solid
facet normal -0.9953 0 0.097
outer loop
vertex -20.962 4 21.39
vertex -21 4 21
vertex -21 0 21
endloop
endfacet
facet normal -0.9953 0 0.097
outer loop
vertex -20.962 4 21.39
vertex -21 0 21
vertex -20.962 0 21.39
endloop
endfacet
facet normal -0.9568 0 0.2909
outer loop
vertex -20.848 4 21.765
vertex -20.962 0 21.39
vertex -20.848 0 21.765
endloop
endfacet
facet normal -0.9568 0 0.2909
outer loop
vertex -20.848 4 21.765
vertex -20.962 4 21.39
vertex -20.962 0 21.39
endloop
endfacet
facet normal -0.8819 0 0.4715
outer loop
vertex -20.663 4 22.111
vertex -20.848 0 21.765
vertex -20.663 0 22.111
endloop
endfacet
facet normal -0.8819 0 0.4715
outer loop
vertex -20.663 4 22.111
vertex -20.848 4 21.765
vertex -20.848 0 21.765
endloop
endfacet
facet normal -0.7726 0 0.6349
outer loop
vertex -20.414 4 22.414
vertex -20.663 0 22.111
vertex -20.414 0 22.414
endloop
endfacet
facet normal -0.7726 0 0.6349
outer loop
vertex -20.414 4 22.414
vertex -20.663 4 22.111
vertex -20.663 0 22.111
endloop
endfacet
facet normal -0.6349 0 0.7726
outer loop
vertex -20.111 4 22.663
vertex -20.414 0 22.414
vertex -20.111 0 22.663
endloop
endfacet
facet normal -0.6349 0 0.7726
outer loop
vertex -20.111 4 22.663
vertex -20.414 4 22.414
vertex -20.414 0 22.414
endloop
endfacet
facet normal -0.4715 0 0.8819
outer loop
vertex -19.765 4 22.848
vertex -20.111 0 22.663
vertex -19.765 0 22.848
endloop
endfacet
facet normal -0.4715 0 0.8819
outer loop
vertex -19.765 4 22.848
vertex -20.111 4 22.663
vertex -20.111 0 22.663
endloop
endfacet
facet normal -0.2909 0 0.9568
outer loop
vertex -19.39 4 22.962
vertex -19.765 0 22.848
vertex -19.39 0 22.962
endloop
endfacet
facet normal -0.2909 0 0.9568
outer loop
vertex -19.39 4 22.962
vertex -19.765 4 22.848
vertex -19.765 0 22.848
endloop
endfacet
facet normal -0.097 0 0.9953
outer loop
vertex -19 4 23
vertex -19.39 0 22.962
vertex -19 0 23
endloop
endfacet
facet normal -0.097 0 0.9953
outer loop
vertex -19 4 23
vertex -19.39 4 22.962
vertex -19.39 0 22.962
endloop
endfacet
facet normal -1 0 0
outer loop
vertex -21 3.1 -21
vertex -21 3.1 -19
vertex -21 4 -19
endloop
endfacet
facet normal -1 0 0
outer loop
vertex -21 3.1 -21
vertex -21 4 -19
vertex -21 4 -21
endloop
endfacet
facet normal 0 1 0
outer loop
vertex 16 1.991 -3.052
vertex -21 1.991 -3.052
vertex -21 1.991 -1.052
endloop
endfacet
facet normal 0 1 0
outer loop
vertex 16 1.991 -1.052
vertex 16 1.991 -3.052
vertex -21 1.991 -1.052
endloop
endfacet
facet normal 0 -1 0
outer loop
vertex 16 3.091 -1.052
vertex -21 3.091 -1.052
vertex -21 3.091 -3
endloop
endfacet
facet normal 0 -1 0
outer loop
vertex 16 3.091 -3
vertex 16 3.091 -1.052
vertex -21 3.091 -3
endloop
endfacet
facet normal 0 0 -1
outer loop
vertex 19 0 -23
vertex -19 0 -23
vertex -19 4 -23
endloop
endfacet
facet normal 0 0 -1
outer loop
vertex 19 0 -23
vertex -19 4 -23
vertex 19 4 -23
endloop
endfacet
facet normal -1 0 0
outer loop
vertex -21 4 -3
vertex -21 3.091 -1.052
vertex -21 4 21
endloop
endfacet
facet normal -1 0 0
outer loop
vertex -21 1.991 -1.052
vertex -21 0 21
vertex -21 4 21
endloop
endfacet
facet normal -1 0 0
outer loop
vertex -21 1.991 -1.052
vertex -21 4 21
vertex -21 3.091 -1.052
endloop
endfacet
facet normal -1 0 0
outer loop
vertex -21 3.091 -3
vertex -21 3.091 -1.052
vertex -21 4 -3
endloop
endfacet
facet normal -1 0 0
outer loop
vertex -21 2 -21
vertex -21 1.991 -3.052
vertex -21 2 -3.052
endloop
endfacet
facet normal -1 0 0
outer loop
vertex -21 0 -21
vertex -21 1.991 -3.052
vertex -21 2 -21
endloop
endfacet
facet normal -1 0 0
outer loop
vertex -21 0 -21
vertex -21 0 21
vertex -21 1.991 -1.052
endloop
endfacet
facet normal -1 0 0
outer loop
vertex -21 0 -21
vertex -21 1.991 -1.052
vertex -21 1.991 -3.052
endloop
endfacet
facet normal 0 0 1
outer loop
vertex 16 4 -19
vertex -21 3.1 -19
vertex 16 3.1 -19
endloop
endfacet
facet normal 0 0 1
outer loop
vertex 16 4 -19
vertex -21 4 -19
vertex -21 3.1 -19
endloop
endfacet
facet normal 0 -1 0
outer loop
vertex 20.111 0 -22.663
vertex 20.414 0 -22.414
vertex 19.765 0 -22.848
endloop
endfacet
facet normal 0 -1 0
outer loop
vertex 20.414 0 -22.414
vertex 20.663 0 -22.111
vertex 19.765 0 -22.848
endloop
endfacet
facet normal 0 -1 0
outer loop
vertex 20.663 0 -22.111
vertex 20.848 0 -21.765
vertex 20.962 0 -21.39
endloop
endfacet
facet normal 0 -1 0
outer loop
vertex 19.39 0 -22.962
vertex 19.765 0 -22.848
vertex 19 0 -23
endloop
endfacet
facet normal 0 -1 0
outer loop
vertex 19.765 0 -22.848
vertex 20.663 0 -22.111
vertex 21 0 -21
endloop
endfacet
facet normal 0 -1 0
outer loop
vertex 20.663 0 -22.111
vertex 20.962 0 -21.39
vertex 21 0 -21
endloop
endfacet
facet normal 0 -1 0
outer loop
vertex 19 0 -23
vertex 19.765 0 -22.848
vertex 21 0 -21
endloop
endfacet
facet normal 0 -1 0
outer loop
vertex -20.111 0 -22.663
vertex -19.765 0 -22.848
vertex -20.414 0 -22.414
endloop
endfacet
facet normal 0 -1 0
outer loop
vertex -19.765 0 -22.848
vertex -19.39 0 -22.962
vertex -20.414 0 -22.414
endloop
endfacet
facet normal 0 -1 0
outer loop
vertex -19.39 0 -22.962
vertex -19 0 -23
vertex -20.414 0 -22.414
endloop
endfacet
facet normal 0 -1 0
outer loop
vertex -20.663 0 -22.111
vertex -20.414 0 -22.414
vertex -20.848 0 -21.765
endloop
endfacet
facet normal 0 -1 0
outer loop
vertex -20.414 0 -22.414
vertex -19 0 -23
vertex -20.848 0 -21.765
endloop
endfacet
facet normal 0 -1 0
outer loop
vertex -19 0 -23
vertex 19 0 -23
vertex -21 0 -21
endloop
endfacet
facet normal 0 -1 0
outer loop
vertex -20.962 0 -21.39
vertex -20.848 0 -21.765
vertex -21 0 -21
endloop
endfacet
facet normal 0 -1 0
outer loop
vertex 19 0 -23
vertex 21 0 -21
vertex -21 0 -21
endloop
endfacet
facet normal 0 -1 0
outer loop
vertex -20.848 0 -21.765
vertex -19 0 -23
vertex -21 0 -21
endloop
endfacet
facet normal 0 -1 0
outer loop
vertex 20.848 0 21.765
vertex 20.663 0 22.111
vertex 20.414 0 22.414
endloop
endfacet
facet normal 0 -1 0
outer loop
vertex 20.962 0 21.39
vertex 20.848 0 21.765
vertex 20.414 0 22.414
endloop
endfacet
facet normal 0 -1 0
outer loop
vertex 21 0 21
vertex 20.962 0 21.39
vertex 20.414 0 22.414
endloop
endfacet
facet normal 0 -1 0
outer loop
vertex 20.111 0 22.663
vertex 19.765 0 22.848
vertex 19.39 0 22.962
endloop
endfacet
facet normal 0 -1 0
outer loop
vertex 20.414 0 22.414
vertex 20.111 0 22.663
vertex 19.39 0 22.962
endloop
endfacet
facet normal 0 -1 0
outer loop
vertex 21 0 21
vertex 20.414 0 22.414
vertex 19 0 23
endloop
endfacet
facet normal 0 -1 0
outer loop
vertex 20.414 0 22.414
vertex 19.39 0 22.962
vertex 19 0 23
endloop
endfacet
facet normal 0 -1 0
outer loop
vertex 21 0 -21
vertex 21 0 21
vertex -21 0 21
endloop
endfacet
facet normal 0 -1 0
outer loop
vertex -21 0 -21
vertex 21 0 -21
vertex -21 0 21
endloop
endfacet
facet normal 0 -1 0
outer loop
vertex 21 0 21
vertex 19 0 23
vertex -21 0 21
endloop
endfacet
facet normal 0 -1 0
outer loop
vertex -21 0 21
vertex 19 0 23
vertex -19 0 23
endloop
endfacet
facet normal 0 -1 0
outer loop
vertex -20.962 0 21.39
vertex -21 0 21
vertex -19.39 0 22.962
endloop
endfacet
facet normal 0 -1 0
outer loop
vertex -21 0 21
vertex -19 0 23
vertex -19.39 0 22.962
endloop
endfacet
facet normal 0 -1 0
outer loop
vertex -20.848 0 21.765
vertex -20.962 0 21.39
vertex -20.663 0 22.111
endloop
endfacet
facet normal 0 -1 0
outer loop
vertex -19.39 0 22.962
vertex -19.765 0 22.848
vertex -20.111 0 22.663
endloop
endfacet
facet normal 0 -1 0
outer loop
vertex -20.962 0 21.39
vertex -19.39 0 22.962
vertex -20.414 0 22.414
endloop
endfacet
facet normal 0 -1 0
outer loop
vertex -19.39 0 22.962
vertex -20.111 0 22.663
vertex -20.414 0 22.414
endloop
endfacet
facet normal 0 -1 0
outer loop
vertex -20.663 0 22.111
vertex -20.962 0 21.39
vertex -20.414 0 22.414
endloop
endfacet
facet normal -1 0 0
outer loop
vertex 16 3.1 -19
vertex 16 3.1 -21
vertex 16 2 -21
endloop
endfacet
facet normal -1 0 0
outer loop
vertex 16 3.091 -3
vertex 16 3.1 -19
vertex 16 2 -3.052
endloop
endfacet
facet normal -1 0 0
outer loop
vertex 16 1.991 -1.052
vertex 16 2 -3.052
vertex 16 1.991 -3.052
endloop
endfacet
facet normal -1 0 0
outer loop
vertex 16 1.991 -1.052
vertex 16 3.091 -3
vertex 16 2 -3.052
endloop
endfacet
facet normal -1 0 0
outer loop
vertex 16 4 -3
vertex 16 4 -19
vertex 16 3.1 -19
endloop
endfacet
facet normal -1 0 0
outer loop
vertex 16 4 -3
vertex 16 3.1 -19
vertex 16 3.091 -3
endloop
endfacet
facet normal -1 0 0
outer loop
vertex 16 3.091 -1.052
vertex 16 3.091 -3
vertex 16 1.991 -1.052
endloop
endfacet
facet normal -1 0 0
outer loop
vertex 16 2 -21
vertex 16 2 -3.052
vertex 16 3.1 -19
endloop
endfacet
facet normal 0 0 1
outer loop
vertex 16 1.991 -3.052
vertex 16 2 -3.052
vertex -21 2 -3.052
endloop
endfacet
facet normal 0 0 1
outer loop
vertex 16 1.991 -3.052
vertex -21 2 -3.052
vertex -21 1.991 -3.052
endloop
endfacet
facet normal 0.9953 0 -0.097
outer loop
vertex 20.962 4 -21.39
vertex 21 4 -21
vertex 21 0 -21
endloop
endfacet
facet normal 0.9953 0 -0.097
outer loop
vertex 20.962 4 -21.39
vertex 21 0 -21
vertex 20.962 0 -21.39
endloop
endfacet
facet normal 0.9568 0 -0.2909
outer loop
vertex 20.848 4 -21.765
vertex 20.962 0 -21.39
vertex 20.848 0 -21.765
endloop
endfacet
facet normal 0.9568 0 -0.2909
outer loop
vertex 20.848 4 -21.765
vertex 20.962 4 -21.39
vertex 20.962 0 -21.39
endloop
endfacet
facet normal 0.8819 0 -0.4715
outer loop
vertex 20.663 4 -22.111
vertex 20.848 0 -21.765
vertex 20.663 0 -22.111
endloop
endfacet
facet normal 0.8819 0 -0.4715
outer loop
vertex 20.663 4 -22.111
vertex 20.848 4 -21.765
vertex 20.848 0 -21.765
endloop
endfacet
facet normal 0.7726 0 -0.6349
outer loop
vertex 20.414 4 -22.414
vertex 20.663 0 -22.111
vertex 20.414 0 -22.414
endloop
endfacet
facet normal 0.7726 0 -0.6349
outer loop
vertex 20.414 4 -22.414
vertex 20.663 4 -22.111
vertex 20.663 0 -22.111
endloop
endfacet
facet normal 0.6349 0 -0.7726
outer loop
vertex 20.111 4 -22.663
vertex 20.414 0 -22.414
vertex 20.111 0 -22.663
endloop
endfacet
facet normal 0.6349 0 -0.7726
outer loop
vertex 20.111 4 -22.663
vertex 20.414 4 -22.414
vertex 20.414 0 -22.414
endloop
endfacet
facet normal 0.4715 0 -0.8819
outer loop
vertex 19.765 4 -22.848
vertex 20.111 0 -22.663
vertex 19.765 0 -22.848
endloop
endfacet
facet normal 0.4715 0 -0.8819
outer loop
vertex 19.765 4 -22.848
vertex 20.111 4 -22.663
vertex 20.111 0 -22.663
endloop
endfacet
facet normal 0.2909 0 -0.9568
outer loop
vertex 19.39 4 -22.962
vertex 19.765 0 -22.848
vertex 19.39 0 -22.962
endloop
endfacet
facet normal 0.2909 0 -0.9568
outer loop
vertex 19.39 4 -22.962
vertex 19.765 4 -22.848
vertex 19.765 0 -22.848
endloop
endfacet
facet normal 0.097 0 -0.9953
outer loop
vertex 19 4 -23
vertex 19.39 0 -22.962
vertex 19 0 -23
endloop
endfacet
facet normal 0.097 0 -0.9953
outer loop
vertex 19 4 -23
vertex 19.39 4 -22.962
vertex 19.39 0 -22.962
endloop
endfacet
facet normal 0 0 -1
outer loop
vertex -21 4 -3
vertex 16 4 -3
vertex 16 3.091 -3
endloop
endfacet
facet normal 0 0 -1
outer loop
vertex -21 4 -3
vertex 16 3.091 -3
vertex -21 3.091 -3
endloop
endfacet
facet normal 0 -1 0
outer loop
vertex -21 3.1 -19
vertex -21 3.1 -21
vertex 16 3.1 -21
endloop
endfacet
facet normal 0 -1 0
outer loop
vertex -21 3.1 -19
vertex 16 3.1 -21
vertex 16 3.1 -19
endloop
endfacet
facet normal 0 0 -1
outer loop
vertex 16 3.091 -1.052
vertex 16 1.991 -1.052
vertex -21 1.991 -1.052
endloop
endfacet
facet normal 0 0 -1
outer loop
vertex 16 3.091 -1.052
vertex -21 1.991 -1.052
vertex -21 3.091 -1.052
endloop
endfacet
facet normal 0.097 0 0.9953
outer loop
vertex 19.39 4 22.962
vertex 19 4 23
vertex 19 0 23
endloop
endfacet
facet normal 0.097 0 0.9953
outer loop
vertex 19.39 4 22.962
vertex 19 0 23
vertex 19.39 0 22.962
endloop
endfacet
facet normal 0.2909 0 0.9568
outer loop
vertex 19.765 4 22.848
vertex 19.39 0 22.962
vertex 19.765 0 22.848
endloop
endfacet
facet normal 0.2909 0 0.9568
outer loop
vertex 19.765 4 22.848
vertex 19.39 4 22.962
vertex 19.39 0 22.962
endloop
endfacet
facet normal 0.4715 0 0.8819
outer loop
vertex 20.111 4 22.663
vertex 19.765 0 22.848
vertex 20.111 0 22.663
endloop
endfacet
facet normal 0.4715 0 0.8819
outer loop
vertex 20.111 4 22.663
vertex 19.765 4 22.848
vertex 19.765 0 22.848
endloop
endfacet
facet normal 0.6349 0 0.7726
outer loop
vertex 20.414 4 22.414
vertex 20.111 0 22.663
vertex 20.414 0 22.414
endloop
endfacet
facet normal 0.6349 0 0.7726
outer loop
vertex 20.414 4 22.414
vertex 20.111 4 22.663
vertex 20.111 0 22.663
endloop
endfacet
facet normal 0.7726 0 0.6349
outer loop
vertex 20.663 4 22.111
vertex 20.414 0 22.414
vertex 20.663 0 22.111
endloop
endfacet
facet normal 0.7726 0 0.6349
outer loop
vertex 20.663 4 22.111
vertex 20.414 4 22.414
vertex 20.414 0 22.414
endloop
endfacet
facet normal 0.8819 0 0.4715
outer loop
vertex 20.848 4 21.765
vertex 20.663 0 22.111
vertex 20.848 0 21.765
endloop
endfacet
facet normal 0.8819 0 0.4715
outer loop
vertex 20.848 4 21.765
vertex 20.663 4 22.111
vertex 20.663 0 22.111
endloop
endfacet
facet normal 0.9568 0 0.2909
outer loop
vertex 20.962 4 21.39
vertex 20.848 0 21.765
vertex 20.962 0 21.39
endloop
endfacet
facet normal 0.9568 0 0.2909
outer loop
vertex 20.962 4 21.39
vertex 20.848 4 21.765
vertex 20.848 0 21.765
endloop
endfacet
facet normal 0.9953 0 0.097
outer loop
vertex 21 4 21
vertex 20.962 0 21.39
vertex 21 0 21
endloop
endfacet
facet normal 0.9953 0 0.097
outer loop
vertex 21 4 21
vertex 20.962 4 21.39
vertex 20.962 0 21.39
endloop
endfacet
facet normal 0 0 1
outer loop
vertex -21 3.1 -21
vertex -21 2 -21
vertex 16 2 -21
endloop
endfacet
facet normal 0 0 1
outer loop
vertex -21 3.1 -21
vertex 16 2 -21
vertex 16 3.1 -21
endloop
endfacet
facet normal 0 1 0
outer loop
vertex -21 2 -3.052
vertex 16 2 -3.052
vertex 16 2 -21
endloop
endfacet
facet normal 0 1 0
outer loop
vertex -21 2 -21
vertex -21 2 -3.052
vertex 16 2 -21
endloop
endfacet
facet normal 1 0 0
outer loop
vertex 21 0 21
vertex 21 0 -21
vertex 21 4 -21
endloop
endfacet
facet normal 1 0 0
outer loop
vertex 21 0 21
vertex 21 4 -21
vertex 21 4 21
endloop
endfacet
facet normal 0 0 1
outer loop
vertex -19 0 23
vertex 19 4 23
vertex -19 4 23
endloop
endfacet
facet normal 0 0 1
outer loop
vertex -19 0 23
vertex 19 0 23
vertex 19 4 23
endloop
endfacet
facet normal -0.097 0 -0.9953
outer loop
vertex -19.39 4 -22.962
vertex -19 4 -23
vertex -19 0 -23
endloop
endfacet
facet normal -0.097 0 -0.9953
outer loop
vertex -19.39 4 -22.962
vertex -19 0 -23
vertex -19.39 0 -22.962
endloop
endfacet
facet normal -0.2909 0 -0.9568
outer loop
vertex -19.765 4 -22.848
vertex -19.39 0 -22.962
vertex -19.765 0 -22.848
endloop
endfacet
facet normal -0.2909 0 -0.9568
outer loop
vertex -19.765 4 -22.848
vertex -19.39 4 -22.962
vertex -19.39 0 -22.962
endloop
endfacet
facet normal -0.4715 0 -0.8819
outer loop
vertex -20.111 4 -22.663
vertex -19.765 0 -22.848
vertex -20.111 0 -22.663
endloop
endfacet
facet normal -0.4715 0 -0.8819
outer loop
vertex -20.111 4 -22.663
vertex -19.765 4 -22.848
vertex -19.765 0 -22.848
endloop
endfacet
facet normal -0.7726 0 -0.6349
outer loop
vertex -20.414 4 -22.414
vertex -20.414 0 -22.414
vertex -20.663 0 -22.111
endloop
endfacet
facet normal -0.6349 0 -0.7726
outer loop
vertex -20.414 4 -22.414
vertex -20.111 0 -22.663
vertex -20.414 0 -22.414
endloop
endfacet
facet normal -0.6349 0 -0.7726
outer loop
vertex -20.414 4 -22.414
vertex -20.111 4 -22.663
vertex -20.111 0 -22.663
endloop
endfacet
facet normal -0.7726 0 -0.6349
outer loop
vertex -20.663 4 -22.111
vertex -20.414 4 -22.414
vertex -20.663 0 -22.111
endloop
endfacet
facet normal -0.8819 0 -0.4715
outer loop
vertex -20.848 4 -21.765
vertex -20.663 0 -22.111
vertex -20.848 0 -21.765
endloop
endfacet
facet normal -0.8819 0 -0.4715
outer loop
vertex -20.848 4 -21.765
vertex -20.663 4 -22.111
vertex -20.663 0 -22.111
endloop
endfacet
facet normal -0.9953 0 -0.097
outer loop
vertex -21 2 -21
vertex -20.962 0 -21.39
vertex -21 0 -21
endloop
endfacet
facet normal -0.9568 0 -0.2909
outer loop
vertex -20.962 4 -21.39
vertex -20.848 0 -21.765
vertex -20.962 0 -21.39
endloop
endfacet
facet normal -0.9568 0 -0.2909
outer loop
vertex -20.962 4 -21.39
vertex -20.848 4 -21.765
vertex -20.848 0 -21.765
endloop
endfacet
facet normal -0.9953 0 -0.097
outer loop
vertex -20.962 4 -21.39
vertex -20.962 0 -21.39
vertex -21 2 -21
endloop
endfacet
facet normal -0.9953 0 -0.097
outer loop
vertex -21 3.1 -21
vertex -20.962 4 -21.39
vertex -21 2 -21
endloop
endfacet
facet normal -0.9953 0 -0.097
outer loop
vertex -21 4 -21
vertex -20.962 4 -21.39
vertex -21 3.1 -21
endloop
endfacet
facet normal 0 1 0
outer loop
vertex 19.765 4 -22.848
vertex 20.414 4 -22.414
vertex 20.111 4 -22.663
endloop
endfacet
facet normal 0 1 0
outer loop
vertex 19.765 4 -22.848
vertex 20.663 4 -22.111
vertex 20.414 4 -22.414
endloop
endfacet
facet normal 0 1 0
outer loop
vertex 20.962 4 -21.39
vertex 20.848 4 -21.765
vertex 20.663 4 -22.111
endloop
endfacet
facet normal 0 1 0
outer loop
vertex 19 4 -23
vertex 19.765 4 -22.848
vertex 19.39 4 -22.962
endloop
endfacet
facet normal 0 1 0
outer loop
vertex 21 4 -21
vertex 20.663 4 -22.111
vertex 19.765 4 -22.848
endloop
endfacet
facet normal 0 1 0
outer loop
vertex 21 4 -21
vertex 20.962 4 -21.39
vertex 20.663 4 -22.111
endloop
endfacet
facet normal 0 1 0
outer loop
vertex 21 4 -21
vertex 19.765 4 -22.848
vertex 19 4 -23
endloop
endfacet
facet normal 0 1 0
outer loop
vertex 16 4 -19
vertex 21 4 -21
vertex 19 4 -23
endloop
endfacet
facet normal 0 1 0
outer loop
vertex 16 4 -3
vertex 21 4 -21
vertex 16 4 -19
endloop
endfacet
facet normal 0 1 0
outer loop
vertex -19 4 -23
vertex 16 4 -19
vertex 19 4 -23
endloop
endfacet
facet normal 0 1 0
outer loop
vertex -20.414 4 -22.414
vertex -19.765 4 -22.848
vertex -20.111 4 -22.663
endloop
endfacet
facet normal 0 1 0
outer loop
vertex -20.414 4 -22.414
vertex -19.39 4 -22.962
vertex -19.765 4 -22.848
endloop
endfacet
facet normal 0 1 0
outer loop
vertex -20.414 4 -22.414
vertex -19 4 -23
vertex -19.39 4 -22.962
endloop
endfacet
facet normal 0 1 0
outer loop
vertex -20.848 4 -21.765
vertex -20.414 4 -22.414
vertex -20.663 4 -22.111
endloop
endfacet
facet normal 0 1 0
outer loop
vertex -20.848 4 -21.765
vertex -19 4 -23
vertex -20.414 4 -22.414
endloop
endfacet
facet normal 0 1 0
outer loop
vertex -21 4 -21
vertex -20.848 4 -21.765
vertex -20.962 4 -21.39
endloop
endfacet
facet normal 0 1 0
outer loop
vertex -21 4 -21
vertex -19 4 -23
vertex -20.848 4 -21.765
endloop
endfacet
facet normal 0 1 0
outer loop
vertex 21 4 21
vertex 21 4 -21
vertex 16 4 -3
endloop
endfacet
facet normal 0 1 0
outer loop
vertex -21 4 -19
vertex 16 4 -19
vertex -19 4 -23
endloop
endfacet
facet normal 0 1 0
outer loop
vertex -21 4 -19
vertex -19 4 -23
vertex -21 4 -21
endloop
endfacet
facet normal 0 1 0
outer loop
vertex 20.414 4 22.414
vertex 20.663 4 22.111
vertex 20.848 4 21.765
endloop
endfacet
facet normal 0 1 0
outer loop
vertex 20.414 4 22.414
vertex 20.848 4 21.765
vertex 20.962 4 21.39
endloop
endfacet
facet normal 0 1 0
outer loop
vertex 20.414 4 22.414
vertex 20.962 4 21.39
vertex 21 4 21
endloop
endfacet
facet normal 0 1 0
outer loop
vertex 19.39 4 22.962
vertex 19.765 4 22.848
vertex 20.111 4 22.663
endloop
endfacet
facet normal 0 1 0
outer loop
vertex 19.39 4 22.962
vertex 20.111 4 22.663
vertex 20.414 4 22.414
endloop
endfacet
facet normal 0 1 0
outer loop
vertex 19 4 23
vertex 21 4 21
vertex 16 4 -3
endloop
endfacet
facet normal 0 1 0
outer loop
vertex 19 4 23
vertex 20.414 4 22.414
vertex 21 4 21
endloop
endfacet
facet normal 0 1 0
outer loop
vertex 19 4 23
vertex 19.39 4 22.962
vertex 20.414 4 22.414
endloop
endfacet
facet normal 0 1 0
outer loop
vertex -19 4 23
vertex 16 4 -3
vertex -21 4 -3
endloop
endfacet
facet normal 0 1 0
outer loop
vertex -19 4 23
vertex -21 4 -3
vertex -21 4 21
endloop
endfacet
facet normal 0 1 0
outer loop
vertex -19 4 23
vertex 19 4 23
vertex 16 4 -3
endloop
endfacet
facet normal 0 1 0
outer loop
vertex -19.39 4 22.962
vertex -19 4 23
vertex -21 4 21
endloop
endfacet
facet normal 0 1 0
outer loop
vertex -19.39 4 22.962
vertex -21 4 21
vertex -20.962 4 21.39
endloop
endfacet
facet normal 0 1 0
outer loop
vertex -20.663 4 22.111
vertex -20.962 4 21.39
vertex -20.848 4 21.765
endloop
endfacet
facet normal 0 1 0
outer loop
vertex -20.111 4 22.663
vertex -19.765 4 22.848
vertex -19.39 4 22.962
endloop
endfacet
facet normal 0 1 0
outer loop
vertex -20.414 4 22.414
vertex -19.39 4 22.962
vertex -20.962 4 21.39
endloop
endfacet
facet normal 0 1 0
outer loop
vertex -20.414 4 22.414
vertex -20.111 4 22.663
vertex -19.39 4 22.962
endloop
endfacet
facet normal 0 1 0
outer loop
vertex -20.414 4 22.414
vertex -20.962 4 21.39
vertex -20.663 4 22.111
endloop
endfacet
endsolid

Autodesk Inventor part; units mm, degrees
ref_plane "YZ Plane" through (0, 0, 0) normal (1, 0, 0) x (0, 1, 0)
ref_plane "XZ Plane" through (0, 0, 0) normal (0, 1, 0) x (-1, 0, 0)
ref_plane "XY Plane" through (0, 0, 0) normal (0, 0, 1) x (1, 0, 0)
sketch "Sketch1" plane through (0, 0, 0) normal (0, 1, 0) x (-1, 0, 0)
  line L0 (-21, 23) -> (21, 23)
  line L1 (21, 23) -> (21, -23)
  line L2 (21, -23) -> (-21, -23)
  line L3 (-21, -23) -> (-21, 23)
  line L4 (-21, 23) -> (21, -23) construction
  line L5 (21, 23) -> (-21, -23) construction
  point P0 (0, 0)
  dimension "d0" = 42
  dimension "d1" = 46
extrude "wall3" add sketch "Sketch1" along normal blind 4
fillet "Fillet6" radius 2 1 edges at (-21, 2, -23)
fillet "Fillet7" radius 2 1 edges at (21, 2, -23)
fillet "Fillet8" radius 2 1 edges at (-21, 2, 23)
fillet "Fillet9" radius 2 1 edges at (21, 2, 23)
sketch "Sketch10" plane through (0, 4, 0) normal (0, 1, 0) x (1, 0, 0)
  line L0 (-20.8799, 11) -> (21, 11) construction
  line L1 (21, -21) -> (21, 21) projected
  line L2 (14.0018, 23) -> (14.0018, -23) construction
  line L3 (-19, -23) -> (19, -23) projected
  line L4 (19, 23) -> (-19, 23) projected
  line L5 (-21, 19) -> (16, 19)
  line L6 (16, 19) -> (16, 3)
  line L7 (16, 3) -> (-21, 3)
  line L8 (-21, 3) -> (-21, 19)
  line L9 (-21, 19) -> (16, 3) construction
  line L10 (16, 19) -> (-21, 3) construction
  line L11 (-21, 21) -> (-21, -21) projected
  point P0 (0, 0)
  point P1 (-2.5, 11)
  dimension "d98" = 34
  dimension "d99" = 16
  dimension "d100" = 5
extrude "Extrusion8" cut sketch "Sketch10" against normal blind 2
sketch "Sketch12" plane through (-21, 0, -21) normal (-1, 0, 0) x (0, 0, 1)
  line L0 (17.9475, 1.9908) -> (19.9475, 1.9908)
  line L1 (19.9475, 1.9908) -> (19.9475, 3.0908)
  line L2 (19.9475, 3.0908) -> (17.9475, 3.0908)
  line L3 (17.9475, 3.0908) -> (17.9475, 1.9908)
  line L4 (2, 2) -> (0, 2)
  line L5 (0, 2) -> (0, 3.1)
  line L6 (0, 3.1) -> (2, 3.1)
  line L7 (2, 3.1) -> (2, 2)
  point P0 (21, 0)
  dimension "d102" = 0
  dimension "d103" = 2
  dimension "d104" = 1.1
  dimension "d105" = 2
  dimension "d106" = 1.1
extrude "Extrusion9" cut sketch "Sketch12" against normal blind 37
equation "\"d0\" = wallw"
equation "\"d72\" = wall3_thick"
equation "\"d89\" = cornerrad"
equation "\"d90\" = cornerrad"
equation "\"d91\" = cornerrad"
equation "\"d92\" = cornerrad"
equation "\"d98\" = distancefrombottom"
equation "\"d99\" = adapterh"
equation "\"d100\" = -0.5 * adapterw + 0.5 * wallw"
equation "\"d101\" = wall3slotd"
equation "\"d104\" = d106"
equation "\"printer3dtolerance\" = 0.1"
equation "\"wallw\" = 42"
equation "\"wallh\" = 44"
equation "\"cornerrad\" = 2"
equation "\"baseextra\" = 2"
equation "\"wall1_thick\" = 8"
equation "\"wall2_thick\" = 6.4"
equation "\"wall3_thick\" = 4"
equation "\"wall1slot\" = 8.1"
equation "\"wall2slot\" = 6.5"
equation "\"wall3slot\" = 4.1"
equation "\"gap2\" = 28"
equation "\"baseh\" = 79"
equation "\"basew\" = 44"
equation "\"base_thick\" = 6"
equation "\"base_slots_depth\" = 4"
equation "\"servomounth\" = 4"
equation "\"servosmallcircledia\" = 5.9"
equation "\"servomountsquare\" = 4"
equation "\"servobigcircledia\" = 11.6"
equation "\"servo9gw\" = 22.8"
equation "\"distancefromleft\" = 22"
equation "\"servopolygonl\" = 5.9"
equation "\"servopolygonr\" = 6.1"
equation "\"distancefrombottom\" = 34"
equation "\"d49\" = distancefrombottom"
equation "\"adapterh\" = 16"
equation "\"adapterw\" = 32"
equation "\"wall3slotw\" = 36"
equation "\"wall3slotd\" = 2"
equation "\"armslotd\" = 2"
equation "\"armthick\" = 3"
equation "\"armw\" = 34"
equation "\"fanhs\" = 9.6"
equation "\"fanhb\" = 11"
equation "\"adapterwallslotd\" = 2"
equation "\"adapterwallthick\" = 6"
equation "\"hornscrewholed\" = 2"
equation "\"armhornthick\" = 3"
equation "\"hornthick\" = 1.5"
equation "\"hornscrewheadd\" = 3"
properties part number "wall-end" material "Wood (Oak)"
